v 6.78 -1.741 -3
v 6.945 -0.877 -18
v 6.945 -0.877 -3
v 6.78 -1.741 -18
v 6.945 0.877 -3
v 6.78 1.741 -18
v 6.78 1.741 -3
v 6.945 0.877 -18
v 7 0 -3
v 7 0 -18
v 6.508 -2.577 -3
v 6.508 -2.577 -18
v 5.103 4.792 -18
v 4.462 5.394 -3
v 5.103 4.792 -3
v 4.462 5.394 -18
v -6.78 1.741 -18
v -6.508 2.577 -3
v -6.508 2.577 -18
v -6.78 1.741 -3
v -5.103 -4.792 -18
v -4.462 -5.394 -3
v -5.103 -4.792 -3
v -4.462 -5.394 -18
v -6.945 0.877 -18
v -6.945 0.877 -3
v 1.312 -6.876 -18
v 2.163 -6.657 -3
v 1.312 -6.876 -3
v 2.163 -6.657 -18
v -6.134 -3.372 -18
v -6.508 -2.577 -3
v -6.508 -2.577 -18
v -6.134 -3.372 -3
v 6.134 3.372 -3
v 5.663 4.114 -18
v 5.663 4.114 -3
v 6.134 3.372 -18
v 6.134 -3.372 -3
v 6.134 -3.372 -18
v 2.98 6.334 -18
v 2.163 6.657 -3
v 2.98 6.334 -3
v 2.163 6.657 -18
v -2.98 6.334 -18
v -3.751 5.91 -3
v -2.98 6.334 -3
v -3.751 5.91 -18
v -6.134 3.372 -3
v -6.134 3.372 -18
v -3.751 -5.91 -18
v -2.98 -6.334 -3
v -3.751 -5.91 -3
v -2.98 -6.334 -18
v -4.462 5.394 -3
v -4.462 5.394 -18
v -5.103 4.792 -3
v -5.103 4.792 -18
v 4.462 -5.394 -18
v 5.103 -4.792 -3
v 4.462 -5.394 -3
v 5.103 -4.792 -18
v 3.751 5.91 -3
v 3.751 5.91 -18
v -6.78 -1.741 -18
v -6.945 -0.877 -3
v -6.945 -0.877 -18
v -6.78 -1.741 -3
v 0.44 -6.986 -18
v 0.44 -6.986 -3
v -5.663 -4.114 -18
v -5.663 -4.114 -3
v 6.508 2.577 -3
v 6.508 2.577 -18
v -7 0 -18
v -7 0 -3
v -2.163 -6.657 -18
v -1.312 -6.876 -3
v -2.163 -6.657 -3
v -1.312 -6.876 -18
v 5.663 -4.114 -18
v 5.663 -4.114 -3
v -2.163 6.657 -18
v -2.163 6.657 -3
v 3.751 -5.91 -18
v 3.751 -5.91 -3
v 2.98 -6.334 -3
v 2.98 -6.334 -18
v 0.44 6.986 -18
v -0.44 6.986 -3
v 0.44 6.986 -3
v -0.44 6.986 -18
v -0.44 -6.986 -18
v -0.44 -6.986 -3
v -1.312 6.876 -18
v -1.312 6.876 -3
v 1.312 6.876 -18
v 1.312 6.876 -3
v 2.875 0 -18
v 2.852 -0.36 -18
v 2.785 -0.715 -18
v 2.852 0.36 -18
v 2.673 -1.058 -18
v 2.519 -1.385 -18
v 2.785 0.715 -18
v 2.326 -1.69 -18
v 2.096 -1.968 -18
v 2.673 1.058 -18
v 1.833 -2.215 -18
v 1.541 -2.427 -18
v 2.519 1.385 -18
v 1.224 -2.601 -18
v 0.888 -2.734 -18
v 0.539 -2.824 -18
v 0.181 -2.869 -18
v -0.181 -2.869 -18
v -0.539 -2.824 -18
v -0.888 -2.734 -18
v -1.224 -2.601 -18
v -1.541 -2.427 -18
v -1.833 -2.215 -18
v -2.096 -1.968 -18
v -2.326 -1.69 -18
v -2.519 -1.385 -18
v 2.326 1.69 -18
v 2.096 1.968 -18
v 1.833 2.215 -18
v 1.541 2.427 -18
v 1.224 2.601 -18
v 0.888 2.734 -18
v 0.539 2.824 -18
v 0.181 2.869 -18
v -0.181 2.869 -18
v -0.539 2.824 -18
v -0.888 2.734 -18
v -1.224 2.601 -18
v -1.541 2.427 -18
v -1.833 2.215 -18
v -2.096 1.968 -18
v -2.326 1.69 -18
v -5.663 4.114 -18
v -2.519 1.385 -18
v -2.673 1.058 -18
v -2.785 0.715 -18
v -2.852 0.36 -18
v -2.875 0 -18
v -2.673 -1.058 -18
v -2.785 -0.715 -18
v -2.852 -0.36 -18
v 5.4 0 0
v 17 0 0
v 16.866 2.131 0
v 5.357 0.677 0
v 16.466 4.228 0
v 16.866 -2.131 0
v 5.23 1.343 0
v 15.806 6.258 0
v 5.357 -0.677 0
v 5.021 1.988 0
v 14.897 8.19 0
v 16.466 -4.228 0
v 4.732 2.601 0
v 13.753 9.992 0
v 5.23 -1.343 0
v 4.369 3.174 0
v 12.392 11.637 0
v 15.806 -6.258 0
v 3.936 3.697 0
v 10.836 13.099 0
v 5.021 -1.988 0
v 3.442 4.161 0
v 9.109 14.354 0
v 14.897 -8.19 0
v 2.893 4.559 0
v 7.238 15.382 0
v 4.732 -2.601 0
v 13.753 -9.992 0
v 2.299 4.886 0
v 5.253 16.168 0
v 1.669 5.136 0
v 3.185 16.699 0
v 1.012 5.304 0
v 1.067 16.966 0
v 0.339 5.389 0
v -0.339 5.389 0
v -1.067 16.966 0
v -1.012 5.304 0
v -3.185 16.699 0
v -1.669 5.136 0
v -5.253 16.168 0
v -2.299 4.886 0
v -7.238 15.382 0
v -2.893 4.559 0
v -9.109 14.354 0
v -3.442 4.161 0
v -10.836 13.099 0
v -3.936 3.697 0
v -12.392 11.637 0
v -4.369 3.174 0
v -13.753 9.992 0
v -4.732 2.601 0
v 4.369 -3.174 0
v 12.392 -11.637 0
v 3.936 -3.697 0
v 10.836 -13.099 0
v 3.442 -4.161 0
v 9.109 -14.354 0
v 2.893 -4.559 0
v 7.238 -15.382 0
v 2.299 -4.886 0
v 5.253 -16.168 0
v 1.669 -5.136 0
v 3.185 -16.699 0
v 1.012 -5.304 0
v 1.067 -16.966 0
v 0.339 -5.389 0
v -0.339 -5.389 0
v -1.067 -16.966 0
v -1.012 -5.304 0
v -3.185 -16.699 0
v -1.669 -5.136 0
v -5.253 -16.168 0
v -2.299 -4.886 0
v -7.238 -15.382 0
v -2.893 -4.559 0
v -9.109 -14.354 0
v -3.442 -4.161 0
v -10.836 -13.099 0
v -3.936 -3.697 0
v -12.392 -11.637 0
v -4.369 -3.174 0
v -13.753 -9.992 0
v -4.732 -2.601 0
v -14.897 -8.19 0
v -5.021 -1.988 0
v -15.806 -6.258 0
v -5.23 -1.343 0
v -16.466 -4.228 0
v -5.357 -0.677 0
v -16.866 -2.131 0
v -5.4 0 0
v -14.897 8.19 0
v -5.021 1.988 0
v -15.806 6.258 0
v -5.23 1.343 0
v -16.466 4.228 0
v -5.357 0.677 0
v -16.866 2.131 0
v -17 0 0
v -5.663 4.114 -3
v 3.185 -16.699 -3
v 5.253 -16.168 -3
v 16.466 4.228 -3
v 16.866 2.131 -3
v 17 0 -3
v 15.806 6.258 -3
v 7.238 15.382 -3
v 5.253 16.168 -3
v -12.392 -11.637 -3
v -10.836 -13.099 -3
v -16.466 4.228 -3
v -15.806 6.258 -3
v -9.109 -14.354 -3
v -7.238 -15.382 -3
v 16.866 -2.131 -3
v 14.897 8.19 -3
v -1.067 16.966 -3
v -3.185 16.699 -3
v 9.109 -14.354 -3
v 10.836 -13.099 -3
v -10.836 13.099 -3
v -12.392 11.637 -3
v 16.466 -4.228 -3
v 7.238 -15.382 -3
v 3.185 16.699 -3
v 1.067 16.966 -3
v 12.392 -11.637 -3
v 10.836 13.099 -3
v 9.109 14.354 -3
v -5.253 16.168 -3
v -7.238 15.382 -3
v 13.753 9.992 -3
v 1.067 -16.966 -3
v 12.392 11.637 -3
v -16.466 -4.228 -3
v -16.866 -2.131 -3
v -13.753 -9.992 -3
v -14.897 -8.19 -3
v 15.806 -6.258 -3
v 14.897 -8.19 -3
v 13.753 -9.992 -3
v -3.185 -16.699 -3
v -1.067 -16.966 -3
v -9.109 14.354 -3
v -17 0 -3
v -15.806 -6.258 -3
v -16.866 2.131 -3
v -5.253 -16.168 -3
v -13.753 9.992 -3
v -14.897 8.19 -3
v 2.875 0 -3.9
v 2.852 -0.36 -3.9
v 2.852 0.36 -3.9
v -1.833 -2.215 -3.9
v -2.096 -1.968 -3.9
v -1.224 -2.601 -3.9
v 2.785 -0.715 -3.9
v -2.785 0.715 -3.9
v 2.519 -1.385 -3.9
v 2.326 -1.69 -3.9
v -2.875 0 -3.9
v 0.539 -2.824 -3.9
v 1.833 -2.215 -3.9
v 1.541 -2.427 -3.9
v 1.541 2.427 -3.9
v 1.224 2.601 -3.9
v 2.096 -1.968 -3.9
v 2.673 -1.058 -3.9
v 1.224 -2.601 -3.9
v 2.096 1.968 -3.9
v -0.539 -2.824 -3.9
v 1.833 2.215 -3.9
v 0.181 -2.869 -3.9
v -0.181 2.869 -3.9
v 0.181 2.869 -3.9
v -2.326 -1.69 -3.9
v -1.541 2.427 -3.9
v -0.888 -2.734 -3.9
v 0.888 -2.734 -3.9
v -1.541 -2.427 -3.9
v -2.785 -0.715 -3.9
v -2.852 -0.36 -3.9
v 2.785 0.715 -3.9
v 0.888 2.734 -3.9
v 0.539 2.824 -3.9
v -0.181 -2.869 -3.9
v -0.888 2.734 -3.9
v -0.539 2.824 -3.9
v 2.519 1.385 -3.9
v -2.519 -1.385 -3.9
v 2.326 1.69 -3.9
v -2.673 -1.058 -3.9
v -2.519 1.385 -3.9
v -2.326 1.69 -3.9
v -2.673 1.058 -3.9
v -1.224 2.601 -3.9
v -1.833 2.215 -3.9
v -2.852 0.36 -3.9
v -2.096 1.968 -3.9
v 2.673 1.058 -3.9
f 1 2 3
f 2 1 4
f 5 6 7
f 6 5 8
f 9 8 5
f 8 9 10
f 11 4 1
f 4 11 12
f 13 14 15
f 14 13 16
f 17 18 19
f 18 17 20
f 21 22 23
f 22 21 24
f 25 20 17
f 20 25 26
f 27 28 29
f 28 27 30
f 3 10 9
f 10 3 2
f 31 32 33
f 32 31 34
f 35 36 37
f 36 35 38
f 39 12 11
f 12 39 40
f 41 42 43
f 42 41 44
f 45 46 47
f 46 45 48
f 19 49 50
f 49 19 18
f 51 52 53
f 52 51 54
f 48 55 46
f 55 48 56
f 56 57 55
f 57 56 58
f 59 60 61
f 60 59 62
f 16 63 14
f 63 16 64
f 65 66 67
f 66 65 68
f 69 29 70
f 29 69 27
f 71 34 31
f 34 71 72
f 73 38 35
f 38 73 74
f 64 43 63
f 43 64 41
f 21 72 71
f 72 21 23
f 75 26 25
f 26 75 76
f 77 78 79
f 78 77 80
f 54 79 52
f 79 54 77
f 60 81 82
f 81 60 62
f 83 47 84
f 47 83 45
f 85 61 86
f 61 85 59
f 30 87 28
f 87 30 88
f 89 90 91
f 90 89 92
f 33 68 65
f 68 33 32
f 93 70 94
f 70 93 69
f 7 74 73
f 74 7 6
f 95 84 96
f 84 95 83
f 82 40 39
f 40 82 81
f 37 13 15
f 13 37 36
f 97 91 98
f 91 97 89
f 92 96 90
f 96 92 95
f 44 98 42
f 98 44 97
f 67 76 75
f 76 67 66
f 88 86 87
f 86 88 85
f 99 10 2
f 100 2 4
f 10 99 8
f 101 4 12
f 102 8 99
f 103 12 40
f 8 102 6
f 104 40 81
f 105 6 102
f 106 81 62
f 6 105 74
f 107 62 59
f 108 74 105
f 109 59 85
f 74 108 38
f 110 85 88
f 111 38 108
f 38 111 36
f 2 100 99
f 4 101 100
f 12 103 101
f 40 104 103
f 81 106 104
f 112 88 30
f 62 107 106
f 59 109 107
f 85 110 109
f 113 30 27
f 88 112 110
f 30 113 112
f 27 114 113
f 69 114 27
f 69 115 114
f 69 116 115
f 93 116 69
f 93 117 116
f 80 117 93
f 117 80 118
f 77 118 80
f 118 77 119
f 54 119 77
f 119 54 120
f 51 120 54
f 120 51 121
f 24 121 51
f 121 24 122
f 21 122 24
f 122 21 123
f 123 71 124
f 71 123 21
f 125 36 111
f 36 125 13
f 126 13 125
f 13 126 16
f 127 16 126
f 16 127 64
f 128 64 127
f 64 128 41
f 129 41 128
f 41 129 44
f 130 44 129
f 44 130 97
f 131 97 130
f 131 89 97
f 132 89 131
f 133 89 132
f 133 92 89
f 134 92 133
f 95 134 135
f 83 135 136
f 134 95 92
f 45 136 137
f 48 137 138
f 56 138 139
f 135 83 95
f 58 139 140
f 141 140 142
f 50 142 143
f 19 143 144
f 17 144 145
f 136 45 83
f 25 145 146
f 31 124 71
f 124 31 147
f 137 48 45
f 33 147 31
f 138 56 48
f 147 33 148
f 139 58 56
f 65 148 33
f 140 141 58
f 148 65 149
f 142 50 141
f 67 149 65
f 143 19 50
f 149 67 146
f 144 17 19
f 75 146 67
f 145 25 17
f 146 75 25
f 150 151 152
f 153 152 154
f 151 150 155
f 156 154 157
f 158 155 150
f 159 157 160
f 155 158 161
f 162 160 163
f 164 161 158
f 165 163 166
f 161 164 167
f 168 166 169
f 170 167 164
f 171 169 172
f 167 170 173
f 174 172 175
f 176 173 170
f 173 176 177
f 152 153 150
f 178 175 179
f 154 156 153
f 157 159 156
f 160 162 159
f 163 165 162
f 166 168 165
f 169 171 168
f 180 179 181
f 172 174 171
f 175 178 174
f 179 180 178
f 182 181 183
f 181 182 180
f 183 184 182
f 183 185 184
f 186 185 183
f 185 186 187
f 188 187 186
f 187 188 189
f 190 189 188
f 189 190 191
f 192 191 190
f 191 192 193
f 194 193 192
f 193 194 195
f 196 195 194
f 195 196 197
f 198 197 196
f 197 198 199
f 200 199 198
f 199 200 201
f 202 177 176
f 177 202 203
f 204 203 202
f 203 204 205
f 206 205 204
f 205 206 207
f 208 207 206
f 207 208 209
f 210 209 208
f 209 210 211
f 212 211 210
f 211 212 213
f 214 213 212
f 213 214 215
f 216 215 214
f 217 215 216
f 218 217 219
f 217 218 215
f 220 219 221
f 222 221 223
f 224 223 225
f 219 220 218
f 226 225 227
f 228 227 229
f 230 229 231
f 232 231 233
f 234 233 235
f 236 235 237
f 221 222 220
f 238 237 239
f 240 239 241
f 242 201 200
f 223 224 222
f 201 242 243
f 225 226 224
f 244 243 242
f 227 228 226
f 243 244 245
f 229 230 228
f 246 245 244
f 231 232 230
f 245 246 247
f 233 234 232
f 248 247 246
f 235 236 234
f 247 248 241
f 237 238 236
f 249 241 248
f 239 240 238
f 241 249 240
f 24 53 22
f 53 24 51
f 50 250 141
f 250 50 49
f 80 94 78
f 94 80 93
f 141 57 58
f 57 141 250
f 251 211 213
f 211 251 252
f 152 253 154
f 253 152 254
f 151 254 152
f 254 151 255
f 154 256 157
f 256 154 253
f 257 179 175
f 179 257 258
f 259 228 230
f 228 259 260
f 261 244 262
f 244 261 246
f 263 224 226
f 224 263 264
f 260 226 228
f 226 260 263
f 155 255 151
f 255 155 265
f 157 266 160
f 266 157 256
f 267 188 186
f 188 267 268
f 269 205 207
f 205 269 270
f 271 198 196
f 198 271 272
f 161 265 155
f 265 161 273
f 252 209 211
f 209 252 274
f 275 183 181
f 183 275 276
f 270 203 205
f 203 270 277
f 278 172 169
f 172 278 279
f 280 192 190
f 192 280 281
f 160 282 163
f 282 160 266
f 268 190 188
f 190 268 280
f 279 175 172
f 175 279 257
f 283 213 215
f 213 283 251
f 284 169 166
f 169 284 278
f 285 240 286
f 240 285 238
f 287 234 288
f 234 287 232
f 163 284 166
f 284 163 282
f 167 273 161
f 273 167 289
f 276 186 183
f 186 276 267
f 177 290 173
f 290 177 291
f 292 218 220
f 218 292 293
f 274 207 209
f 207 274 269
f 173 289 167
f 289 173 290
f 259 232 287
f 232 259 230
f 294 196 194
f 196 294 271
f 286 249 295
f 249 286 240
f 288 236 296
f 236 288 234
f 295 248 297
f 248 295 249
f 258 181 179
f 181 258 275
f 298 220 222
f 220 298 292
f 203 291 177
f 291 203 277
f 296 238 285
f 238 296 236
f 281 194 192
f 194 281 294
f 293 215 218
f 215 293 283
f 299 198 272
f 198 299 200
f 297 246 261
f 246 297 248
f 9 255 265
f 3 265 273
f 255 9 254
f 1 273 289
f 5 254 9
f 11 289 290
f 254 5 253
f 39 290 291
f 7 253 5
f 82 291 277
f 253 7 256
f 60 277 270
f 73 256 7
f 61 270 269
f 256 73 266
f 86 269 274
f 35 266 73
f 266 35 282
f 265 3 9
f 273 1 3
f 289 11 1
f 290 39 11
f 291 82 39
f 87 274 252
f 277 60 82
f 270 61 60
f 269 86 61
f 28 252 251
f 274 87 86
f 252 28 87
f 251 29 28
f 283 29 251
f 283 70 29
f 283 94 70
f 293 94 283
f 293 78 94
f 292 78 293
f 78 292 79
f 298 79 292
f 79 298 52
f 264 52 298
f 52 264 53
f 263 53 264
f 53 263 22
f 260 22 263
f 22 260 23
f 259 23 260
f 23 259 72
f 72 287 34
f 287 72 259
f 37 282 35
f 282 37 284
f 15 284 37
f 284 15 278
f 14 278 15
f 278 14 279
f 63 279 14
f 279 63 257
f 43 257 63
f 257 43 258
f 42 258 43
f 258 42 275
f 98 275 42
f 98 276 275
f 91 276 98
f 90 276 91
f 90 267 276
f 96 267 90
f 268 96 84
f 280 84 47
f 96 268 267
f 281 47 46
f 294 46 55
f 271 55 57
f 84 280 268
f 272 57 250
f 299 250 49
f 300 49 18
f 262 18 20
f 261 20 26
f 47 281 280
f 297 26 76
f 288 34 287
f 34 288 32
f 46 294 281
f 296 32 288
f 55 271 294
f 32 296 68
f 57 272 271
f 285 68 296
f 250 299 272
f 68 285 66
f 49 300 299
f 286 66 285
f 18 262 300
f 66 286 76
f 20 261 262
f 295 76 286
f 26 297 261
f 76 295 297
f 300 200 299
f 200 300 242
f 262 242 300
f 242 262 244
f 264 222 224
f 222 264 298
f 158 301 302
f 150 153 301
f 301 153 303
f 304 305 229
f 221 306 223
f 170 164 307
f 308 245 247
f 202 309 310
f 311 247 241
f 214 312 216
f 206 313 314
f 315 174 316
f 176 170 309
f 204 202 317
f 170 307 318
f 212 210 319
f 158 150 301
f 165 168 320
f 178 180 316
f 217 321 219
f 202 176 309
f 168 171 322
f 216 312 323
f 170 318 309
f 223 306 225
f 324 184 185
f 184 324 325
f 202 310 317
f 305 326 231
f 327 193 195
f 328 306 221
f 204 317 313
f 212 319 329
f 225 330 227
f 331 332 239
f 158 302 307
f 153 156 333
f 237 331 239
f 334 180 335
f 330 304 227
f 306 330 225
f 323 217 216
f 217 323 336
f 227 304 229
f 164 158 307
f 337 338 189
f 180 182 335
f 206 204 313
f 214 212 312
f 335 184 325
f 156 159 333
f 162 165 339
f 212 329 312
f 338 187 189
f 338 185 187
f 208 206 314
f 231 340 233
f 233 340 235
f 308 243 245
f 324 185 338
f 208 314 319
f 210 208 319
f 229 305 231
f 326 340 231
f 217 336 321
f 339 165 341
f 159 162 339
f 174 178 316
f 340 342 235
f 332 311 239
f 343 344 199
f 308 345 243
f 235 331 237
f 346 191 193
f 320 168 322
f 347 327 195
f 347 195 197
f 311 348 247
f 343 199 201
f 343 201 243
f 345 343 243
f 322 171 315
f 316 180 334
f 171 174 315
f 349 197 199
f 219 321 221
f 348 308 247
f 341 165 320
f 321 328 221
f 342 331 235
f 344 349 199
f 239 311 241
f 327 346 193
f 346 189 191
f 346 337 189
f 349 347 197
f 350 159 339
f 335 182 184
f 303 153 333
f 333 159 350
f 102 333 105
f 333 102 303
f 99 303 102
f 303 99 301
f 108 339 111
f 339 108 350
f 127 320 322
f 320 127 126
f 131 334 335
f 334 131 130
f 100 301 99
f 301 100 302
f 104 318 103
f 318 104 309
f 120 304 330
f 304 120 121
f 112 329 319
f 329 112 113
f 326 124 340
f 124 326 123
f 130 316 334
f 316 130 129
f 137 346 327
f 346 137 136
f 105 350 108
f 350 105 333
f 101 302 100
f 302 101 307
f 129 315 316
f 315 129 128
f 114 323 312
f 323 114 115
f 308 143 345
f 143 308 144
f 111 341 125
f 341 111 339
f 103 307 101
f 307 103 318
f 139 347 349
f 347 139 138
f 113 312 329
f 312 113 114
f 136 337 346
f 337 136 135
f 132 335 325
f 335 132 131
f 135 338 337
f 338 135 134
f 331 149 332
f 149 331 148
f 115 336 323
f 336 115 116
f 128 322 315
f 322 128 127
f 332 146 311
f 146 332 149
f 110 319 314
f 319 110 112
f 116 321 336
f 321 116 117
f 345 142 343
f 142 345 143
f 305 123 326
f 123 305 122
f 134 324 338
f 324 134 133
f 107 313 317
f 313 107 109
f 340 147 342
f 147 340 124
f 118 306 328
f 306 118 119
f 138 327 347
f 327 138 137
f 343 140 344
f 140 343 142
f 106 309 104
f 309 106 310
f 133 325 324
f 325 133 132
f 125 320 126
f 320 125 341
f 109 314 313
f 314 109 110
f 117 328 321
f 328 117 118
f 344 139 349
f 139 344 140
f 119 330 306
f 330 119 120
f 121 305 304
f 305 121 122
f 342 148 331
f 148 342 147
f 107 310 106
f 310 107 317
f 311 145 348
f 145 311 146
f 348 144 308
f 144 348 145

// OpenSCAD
$fn = 50;


difference() {
	union() {
		translate(v = [0, 0, -18.0000000000]) {
			cylinder(h = 18, r = 7.0000000000);
		}
		translate(v = [0, 0, -3.0000000000]) {
			cylinder(h = 3, r = 17.0000000000);
		}
	}
	union() {
		translate(v = [0, 0, 0]) {
			rotate(a = [0, 0, 0]) {
				difference() {
					union() {
						#translate(v = [0, 0, -18.0000000000]) {
							cylinder(h = 18, r = 2.6000000000);
						}
						#translate(v = [0, 0, -3.9000000000]) {
							cylinder(h = 3.9000000000, r1 = 2.8750000000, r2 = 5.4000000000);
						}
						#translate(v = [0, 0, -18.0000000000]) {
							cylinder(h = 18, r = 2.8750000000);
						}
						#translate(v = [0, 0, -18.0000000000]) {
							cylinder(h = 18, r = 2.6000000000);
						}
					}
					union();
				}
			}
		}
	}
}
